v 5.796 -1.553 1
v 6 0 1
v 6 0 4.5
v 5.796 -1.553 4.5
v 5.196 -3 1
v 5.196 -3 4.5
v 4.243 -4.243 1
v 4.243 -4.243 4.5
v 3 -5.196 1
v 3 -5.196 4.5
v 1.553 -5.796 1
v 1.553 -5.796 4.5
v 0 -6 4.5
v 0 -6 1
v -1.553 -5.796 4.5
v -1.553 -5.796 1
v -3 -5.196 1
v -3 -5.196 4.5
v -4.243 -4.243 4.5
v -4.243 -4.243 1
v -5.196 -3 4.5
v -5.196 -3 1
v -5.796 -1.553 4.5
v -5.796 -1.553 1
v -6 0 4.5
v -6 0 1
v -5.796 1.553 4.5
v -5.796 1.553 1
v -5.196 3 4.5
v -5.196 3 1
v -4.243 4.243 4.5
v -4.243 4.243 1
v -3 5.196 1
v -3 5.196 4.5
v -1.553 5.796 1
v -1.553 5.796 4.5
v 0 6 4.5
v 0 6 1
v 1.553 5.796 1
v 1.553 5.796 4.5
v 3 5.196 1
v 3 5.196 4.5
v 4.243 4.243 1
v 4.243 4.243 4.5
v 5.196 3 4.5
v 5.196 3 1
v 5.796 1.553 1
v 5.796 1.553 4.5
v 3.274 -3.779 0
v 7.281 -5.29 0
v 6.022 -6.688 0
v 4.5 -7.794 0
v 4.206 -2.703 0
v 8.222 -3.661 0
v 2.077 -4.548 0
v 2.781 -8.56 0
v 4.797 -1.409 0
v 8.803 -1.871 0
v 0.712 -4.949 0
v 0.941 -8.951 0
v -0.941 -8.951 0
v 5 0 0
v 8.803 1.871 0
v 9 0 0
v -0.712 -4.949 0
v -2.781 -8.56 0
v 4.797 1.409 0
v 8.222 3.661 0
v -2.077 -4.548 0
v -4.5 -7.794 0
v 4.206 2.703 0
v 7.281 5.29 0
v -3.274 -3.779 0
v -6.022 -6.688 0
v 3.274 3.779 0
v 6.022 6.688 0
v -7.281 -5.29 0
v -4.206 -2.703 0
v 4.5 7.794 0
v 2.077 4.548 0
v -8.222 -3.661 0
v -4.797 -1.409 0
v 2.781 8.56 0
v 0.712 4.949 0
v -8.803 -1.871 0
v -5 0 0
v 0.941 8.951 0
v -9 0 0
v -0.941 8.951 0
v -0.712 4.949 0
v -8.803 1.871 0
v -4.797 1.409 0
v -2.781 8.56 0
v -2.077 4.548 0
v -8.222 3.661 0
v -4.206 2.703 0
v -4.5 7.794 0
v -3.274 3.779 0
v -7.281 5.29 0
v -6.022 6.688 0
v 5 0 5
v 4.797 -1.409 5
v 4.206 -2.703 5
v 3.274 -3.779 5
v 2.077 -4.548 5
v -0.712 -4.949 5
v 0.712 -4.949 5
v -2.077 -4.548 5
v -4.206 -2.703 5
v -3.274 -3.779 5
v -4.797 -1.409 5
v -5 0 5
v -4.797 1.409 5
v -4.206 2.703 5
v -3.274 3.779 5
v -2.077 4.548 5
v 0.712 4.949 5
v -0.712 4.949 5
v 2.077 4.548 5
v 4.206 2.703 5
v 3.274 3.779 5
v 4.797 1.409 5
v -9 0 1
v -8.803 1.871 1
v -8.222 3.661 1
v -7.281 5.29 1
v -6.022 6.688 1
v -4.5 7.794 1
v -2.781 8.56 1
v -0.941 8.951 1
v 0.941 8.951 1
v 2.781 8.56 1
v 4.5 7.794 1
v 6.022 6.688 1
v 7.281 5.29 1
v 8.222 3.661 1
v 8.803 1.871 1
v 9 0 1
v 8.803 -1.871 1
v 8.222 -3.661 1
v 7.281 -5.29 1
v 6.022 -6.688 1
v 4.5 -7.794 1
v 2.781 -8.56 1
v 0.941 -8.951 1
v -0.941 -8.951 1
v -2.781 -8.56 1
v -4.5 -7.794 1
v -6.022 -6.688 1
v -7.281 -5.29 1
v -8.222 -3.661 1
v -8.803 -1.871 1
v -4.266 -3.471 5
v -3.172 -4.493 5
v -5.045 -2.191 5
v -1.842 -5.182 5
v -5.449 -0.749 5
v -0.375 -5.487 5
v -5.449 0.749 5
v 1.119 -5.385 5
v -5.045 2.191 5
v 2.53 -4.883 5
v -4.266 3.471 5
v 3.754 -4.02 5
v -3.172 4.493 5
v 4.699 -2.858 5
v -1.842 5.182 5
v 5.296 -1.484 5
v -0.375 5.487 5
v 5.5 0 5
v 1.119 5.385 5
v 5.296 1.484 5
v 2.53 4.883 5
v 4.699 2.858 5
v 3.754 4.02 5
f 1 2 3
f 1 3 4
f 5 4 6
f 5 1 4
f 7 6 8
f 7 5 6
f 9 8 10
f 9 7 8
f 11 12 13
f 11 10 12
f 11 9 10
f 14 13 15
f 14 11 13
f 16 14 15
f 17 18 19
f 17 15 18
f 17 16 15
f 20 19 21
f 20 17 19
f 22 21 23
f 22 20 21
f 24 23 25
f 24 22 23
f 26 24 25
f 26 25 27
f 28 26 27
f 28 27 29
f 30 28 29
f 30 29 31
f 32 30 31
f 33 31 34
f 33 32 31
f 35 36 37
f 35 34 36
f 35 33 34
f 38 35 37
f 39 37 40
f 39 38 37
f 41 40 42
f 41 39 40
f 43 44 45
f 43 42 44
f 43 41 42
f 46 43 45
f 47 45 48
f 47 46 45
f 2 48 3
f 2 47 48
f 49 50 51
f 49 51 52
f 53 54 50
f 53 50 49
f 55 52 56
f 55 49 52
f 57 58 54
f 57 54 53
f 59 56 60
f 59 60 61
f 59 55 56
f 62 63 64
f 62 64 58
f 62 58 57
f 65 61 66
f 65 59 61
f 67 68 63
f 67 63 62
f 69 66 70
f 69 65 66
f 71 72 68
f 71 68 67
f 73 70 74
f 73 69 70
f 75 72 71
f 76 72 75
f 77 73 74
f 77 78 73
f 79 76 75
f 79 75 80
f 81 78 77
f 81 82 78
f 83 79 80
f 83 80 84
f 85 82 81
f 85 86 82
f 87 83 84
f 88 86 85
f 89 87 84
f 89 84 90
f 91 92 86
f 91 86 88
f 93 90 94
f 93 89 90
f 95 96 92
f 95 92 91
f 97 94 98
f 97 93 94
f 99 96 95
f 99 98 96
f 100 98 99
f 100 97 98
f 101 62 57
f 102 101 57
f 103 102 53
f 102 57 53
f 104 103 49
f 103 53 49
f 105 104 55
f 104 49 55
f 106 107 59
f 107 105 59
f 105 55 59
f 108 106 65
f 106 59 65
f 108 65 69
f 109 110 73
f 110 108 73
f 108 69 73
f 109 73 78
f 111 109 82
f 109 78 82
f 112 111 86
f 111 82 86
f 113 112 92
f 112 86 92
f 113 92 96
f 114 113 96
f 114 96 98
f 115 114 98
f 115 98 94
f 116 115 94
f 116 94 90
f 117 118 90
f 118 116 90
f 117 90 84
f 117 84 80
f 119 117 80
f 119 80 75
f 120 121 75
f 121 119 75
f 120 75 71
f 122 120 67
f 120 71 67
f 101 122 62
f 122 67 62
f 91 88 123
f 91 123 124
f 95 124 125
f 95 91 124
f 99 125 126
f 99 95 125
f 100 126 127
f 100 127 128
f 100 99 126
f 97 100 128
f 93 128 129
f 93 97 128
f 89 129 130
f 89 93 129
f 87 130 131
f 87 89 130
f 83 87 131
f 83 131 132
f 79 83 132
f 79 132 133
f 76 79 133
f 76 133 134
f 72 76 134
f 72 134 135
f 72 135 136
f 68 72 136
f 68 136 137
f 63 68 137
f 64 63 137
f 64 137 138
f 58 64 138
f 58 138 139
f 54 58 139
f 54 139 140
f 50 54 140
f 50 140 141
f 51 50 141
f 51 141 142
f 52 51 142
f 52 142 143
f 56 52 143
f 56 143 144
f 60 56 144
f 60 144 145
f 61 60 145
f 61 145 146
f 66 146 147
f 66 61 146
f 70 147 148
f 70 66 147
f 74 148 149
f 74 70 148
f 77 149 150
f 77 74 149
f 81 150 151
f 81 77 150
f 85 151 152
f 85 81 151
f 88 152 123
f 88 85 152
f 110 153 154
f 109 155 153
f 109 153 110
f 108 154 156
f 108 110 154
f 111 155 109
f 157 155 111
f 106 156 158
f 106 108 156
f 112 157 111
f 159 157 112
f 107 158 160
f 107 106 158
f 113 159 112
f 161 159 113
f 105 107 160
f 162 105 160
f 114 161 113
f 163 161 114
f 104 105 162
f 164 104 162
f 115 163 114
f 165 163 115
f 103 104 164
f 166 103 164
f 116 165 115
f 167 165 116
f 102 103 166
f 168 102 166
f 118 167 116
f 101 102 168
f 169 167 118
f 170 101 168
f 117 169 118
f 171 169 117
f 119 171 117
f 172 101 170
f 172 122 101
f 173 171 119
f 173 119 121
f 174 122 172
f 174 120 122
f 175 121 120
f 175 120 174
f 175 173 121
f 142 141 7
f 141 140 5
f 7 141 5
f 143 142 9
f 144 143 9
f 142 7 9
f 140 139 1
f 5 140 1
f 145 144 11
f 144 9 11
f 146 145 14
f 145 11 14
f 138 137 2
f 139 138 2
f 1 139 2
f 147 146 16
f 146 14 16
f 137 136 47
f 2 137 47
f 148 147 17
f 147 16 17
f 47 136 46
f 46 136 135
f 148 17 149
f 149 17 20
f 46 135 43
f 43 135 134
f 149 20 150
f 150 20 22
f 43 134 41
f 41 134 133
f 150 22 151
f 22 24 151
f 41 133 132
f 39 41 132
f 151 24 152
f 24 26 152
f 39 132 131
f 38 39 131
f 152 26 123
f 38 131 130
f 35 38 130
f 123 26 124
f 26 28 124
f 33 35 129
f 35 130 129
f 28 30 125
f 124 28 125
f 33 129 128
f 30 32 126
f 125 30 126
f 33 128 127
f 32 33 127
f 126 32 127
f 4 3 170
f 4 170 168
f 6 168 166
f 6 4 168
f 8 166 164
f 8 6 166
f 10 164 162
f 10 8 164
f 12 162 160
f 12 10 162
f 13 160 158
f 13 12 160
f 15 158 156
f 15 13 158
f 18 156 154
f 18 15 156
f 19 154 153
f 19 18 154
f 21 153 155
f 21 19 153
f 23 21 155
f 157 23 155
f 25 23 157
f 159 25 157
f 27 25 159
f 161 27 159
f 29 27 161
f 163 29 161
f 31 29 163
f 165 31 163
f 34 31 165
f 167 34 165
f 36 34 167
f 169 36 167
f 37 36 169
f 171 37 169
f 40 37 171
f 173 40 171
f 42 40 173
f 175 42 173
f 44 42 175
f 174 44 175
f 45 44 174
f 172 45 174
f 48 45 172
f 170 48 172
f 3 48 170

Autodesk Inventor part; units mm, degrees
ref_plane "YZ Plane" through (0, 0, 0) normal (1, 0, 0) x (0, 1, 0)
ref_plane "XZ Plane" through (0, 0, 0) normal (0, 1, 0) x (-1, 0, 0)
ref_plane "XY Plane" through (0, 0, 0) normal (0, 0, 1) x (1, 0, 0)
sketch "スケッチ1" plane through (0, 0, 0) normal (0, 0, 1) x (1, 0, 0)
  circle A0 centre (0, 0) radius 6
  circle A1 centre (0, 0) radius 5
  dimension "d0" = 12
  dimension "d1" = 10
extrude "押し出し1" add sketch "スケッチ1" along normal blind 5
chamfer "面取り1" distance 0.5 angle 45 1 edges at (-6, 0, 5)
sketch "スケッチ2" plane through (0, 0, 0) normal (0, 0, -1) x (-1, 0, 0)
  circle A0 centre (0, 0) radius 9
  circle A1 centre (0, 0) radius 5 projected
  dimension "d7" = 18
extrude "押し出し2" add sketch "スケッチ2" against normal blind 1
properties part number "オイレスw5f10-12a" material "アセタール樹脂、黒"
